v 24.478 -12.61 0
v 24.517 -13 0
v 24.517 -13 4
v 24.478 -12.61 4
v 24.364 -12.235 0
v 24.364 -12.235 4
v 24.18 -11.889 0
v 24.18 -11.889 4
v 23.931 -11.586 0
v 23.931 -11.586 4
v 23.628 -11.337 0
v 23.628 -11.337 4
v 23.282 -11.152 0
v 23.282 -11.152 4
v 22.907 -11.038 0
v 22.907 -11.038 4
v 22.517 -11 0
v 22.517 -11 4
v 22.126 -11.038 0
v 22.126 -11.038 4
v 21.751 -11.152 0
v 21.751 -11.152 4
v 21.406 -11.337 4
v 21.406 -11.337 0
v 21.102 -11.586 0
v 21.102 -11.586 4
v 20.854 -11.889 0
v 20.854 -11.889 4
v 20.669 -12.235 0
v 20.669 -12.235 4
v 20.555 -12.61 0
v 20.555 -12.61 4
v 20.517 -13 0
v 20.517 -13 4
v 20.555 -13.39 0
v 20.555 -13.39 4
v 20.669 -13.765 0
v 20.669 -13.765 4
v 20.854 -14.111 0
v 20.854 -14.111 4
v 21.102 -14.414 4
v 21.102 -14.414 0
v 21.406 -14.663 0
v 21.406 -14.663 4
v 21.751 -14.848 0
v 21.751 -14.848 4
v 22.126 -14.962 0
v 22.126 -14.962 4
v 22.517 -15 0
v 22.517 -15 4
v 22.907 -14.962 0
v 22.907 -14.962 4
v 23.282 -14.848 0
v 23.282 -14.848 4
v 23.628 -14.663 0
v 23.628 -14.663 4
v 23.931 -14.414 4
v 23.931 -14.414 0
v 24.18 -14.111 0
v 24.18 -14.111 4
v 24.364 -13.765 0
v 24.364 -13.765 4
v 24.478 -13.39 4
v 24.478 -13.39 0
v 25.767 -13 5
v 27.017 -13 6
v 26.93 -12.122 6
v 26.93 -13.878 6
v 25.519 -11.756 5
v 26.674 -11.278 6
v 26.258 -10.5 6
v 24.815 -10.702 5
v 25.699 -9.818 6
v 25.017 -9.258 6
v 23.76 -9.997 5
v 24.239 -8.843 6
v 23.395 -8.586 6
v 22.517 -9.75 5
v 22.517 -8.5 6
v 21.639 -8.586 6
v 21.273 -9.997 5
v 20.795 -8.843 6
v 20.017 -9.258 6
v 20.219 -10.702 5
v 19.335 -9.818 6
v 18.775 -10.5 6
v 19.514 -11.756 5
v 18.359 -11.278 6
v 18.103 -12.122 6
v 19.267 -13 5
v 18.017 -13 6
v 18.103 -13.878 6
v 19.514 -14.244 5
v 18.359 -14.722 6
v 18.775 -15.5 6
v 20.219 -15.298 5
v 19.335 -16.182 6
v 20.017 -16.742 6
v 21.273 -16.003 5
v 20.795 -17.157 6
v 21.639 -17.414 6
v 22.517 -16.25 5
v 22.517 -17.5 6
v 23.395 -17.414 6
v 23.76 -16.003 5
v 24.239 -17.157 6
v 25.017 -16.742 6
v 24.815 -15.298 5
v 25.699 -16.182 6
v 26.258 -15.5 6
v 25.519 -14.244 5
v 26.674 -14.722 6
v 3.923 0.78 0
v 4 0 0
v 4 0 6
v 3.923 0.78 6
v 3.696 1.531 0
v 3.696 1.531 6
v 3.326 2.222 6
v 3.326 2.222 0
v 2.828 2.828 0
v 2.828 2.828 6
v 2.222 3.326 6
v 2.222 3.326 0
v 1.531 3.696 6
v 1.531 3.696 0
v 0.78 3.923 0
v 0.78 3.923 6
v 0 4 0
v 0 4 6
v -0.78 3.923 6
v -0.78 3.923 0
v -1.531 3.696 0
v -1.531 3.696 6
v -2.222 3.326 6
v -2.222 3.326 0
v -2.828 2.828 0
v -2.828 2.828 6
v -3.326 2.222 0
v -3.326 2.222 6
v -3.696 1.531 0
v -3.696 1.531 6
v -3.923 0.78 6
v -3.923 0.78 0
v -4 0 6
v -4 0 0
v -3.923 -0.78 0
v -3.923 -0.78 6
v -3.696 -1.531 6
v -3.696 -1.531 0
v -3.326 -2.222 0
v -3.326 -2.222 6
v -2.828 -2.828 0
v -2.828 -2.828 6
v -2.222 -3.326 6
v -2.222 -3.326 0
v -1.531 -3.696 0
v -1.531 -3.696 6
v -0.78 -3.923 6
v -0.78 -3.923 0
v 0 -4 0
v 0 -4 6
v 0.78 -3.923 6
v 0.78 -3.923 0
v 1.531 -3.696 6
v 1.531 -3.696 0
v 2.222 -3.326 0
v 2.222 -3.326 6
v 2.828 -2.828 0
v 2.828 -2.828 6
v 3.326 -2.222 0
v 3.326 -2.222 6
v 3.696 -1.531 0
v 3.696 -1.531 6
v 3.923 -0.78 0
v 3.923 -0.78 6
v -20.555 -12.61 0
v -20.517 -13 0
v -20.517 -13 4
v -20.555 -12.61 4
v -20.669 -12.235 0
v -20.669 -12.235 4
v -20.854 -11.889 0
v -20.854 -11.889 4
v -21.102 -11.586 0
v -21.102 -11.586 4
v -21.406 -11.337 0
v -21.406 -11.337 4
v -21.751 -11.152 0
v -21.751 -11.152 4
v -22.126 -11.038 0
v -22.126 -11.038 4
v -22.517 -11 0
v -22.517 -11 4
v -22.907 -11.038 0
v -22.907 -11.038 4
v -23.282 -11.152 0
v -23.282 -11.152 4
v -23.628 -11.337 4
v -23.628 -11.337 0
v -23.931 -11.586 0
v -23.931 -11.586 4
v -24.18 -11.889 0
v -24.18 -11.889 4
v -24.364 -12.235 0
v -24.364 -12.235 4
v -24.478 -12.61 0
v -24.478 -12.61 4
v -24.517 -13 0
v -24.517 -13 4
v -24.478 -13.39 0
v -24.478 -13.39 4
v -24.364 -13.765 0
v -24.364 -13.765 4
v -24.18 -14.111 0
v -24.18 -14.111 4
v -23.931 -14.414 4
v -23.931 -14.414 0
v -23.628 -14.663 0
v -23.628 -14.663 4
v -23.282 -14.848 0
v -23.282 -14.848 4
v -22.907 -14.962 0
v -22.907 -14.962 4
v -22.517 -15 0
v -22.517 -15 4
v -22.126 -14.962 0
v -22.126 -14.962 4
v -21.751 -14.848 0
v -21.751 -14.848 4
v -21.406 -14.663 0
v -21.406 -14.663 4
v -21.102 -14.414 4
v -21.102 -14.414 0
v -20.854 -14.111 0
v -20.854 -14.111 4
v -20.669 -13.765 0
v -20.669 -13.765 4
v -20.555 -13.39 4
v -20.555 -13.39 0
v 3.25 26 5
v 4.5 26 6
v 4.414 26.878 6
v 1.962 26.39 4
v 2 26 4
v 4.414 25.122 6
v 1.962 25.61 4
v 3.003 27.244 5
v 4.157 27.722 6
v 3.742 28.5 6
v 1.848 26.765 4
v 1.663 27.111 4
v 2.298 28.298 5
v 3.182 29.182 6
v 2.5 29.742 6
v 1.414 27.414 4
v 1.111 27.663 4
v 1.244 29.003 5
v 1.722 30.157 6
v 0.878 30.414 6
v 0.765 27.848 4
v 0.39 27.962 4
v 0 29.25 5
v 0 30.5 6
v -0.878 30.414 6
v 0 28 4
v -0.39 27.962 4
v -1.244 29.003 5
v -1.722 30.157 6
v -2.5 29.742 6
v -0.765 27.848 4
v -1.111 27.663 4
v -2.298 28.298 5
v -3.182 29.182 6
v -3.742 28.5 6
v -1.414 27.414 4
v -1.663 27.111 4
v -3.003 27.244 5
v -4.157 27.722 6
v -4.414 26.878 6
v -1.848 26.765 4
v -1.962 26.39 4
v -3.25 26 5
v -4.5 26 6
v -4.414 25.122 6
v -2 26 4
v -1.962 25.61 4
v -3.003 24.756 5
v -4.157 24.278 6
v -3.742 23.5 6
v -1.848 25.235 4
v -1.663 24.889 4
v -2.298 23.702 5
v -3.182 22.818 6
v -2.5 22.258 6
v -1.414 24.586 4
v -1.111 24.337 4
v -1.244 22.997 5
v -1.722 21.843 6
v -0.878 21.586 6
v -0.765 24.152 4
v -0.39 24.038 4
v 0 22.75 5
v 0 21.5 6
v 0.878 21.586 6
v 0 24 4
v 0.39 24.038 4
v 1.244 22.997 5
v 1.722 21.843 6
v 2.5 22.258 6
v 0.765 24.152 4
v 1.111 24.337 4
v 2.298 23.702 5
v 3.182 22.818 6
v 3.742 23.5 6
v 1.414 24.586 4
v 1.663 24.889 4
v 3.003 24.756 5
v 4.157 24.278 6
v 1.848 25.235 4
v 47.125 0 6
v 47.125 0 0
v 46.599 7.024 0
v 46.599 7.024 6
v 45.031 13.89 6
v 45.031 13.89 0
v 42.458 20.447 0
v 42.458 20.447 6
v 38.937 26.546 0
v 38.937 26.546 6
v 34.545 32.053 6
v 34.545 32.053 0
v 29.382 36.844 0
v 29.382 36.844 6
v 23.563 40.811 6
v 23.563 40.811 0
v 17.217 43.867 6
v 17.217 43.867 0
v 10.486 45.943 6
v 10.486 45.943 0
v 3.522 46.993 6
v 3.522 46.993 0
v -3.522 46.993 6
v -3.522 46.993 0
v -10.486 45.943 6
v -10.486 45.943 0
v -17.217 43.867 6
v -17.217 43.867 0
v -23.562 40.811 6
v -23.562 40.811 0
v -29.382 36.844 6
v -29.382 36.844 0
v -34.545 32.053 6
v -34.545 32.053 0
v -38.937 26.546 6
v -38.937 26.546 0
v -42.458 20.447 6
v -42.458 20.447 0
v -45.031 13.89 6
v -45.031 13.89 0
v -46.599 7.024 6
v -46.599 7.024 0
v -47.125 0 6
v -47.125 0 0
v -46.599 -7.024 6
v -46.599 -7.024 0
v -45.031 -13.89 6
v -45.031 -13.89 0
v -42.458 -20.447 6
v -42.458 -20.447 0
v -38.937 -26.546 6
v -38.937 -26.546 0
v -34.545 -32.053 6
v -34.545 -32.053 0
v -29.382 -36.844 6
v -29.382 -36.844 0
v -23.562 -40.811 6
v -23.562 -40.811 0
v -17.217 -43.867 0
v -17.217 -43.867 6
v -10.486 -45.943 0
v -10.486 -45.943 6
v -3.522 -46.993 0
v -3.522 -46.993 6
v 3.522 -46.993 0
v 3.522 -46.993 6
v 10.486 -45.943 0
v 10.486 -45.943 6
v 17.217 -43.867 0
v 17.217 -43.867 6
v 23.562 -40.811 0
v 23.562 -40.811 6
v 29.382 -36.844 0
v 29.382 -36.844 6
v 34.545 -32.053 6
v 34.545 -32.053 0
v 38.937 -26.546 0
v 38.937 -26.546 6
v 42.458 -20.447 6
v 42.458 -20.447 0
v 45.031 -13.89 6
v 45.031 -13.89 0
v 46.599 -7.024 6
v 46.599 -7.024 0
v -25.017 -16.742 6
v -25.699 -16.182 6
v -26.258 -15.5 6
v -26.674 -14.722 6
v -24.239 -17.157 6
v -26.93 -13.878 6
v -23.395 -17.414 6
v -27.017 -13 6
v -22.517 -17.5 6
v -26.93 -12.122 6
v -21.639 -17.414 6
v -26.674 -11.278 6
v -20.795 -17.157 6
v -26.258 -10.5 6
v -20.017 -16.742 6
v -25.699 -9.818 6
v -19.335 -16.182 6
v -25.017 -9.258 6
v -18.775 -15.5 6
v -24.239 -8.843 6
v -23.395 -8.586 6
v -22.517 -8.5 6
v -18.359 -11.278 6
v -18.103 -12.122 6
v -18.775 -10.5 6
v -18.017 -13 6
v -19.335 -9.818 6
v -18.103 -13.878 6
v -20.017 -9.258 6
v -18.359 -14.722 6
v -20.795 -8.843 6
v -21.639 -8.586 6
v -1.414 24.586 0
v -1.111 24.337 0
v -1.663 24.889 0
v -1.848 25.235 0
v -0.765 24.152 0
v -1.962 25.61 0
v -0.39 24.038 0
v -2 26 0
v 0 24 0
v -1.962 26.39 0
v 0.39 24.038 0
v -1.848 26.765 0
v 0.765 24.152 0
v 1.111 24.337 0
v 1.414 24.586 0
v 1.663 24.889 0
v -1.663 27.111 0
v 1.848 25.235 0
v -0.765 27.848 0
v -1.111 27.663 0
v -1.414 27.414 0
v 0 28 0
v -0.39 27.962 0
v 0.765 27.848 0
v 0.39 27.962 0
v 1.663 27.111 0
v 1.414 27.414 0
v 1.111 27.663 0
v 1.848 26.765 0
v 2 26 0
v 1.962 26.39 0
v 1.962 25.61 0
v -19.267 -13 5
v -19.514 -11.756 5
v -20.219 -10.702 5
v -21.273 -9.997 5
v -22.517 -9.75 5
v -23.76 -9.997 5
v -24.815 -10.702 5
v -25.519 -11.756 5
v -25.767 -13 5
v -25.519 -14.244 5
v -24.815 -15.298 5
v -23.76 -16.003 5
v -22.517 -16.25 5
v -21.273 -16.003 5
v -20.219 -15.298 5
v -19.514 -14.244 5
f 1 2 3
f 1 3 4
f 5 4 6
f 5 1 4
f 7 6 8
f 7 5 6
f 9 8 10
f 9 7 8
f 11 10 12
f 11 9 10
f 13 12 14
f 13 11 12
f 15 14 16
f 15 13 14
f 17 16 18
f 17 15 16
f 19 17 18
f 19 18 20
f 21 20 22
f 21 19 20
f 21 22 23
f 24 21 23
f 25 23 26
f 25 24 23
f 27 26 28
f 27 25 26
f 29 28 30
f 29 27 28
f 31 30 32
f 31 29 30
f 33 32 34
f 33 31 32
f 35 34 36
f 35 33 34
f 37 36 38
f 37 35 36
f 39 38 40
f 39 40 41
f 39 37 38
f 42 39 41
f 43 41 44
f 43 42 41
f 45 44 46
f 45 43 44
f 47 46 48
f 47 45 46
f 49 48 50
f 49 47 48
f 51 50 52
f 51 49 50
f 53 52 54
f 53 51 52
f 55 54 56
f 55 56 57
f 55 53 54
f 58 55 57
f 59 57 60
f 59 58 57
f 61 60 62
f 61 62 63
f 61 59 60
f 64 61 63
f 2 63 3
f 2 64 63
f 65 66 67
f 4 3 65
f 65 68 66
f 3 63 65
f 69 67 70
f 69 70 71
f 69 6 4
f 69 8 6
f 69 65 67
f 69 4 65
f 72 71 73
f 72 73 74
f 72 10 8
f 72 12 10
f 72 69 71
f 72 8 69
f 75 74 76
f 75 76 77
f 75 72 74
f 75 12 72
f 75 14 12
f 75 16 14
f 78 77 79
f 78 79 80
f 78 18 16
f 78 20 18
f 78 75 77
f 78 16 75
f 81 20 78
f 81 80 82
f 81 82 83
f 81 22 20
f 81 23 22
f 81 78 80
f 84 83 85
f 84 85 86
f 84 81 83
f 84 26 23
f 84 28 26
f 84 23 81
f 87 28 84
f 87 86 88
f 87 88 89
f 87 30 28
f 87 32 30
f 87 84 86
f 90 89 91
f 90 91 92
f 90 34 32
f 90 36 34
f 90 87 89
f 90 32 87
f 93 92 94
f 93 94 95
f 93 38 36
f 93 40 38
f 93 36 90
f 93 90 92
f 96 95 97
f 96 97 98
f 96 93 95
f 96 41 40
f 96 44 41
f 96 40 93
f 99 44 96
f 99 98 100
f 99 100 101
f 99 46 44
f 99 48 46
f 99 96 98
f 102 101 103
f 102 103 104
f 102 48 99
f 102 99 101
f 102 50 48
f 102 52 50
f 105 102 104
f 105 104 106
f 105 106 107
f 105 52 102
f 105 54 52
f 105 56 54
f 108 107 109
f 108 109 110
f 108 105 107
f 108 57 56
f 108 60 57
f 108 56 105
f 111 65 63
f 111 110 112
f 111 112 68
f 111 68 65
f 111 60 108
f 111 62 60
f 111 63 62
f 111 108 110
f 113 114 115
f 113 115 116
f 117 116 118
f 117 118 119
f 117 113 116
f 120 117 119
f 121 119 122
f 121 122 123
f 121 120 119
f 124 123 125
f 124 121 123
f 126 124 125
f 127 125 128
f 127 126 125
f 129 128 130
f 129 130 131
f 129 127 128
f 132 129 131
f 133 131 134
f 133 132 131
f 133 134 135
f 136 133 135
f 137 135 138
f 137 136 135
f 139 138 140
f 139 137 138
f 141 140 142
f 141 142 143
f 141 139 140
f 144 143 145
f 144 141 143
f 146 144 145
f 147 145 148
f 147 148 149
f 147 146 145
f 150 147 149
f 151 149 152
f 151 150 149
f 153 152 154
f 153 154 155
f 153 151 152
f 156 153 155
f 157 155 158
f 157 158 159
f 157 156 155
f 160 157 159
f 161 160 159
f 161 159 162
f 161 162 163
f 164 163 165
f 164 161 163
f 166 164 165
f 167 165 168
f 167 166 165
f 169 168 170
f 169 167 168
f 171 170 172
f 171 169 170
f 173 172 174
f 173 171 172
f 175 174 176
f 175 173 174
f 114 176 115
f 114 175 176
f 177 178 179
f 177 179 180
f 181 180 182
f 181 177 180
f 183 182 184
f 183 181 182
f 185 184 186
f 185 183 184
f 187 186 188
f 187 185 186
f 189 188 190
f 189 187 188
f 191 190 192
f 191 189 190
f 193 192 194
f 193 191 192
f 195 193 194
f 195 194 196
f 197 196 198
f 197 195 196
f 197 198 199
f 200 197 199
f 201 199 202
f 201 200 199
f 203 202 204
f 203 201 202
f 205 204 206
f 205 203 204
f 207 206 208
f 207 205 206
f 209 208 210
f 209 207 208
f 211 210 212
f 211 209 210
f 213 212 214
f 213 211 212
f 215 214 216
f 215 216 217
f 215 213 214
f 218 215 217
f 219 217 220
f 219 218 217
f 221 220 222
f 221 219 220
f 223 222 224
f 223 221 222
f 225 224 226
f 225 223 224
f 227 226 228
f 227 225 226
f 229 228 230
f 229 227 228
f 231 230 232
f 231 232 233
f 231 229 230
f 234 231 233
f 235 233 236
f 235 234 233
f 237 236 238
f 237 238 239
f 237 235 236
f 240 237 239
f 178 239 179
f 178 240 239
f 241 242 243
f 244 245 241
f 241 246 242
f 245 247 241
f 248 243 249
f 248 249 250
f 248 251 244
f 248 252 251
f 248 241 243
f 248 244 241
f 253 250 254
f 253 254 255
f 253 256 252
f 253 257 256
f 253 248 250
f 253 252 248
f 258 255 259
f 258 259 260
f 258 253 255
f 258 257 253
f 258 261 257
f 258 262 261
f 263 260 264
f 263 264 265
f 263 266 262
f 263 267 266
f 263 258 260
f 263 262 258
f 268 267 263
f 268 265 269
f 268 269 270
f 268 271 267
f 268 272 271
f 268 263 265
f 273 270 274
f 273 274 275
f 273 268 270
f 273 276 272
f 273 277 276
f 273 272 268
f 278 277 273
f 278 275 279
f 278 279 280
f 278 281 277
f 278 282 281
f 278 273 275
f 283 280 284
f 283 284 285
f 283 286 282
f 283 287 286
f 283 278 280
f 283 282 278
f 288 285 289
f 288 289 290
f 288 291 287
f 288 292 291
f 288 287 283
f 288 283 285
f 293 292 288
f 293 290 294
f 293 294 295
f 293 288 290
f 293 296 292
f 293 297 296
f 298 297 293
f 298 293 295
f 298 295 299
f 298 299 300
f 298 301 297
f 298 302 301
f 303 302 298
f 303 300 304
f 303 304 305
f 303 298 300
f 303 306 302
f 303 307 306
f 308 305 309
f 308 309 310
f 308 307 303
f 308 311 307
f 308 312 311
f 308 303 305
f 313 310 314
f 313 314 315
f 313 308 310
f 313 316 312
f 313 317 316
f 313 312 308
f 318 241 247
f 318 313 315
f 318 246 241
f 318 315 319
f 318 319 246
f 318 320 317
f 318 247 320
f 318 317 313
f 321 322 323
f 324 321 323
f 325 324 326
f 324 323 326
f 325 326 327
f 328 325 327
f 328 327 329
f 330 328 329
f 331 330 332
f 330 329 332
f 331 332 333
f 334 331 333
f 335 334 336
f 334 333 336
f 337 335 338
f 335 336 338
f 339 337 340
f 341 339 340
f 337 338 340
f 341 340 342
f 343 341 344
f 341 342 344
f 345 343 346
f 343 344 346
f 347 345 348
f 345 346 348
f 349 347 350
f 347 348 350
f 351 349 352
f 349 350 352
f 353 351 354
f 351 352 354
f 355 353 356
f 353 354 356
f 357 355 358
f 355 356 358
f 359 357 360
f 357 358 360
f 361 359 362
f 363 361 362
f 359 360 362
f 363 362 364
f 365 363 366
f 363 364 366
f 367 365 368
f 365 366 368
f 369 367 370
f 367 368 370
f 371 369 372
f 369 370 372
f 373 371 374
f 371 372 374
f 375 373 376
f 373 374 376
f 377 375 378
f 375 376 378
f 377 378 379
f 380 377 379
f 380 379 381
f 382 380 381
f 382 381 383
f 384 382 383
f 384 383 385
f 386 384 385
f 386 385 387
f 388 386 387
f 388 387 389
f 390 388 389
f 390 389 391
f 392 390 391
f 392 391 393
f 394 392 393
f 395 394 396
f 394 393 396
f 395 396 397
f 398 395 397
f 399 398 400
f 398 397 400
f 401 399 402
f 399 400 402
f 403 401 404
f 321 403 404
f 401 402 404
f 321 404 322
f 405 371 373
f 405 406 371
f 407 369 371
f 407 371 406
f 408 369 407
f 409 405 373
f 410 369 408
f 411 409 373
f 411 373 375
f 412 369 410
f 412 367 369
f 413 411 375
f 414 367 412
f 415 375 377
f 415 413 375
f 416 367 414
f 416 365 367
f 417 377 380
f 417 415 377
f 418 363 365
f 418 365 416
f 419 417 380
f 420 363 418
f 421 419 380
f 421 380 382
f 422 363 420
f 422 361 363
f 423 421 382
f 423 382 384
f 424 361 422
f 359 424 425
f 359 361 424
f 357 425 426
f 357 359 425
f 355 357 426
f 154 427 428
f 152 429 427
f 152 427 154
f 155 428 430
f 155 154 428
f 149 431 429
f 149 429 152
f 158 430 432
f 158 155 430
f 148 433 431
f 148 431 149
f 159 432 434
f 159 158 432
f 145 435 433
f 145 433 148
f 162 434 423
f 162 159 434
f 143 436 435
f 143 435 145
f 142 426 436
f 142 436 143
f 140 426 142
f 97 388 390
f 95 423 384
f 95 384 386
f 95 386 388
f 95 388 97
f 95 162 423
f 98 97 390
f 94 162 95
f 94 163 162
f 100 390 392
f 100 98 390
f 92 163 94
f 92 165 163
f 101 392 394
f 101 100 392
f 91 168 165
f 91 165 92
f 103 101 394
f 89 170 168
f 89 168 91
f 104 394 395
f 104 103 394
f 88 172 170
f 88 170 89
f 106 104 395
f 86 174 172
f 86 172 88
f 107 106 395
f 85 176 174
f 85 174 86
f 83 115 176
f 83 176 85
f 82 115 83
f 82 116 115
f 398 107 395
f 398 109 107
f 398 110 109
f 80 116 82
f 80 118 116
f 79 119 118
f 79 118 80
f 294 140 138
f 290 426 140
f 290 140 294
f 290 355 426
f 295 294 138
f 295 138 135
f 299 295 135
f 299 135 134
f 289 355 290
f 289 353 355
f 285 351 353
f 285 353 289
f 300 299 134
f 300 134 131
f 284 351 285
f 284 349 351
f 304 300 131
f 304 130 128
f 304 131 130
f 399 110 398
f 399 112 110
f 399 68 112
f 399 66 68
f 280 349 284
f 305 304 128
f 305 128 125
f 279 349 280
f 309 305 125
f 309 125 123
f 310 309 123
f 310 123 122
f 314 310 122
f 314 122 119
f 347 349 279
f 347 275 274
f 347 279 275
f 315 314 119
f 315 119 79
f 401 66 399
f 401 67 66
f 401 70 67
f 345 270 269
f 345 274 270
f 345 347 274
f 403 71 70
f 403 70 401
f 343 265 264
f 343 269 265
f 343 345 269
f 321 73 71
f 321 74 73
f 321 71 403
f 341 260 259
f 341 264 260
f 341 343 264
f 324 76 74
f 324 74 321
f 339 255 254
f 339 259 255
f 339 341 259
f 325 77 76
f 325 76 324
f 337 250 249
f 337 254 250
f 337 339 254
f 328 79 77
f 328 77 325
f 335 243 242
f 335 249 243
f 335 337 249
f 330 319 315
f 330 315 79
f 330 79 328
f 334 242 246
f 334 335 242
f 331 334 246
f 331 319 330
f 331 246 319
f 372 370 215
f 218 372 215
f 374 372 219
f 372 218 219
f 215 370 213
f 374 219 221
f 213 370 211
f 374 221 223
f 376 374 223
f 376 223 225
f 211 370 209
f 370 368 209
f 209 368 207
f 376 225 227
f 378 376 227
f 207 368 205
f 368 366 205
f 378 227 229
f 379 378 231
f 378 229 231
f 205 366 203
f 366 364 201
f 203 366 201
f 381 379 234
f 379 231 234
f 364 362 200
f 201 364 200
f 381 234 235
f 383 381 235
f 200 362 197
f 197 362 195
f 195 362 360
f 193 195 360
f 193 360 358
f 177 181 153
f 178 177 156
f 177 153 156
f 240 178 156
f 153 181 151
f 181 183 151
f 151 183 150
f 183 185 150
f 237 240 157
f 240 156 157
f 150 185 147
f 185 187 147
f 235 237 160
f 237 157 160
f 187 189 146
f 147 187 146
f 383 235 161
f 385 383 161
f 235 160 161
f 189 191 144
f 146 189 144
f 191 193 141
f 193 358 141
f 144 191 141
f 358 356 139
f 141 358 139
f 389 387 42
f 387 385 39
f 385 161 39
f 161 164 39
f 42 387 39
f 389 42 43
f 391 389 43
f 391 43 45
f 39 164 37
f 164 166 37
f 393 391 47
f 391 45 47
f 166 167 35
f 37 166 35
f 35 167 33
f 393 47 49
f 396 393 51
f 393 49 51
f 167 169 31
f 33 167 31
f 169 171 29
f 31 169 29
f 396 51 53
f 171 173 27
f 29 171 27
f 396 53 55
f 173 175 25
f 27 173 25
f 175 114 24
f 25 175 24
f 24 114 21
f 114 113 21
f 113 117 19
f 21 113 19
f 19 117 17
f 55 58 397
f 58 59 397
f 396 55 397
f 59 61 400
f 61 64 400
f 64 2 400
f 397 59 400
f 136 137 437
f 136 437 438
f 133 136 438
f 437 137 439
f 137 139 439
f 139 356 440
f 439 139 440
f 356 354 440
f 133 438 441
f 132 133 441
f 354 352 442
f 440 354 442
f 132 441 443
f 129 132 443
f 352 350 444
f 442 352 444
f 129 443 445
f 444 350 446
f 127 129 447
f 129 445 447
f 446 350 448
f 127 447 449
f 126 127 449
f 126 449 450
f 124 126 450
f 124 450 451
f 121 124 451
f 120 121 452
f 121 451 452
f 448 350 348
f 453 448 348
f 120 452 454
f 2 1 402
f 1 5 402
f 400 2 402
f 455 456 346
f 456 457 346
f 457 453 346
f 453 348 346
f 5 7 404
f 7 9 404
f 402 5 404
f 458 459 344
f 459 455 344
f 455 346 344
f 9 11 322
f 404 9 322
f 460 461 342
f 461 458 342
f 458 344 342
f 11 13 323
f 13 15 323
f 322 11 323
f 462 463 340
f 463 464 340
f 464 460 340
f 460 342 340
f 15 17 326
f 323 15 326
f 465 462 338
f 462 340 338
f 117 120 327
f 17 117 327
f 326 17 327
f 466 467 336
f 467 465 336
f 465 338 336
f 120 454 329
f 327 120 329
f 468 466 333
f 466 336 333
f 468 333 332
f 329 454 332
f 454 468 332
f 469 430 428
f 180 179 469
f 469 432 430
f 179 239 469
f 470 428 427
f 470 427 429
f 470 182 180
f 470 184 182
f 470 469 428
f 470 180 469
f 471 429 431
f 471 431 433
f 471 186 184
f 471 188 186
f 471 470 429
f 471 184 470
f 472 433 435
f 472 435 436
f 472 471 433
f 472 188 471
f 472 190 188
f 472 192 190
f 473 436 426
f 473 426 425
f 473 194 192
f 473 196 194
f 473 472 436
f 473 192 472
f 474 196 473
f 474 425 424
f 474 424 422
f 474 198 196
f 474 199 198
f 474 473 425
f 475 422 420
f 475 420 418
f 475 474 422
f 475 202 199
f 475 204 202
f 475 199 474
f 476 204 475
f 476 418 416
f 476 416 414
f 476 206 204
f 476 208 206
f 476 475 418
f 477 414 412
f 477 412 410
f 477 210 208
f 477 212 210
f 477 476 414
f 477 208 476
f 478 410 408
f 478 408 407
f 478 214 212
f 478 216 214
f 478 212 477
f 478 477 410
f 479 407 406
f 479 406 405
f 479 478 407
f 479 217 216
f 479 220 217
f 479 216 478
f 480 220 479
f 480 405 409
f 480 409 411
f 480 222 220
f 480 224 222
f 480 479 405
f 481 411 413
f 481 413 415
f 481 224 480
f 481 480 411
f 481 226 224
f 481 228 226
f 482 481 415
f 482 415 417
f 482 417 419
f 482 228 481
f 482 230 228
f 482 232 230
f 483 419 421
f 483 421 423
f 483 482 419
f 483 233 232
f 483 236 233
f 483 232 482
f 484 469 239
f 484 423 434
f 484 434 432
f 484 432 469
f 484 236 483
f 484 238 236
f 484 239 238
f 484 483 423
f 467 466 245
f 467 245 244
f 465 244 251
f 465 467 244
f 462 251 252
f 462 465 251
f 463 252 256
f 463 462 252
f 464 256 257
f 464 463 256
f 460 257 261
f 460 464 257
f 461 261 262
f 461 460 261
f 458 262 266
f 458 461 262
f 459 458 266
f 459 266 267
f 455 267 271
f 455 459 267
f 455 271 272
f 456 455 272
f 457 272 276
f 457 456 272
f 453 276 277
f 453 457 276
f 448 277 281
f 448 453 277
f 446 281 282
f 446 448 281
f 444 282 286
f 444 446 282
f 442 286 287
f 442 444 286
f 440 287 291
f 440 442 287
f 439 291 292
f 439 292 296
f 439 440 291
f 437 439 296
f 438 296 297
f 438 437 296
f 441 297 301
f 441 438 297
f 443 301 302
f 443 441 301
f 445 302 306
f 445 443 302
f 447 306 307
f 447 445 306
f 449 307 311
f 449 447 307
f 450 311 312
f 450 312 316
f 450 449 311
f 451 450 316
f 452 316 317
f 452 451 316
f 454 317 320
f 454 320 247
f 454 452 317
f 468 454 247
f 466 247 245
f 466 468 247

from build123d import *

# Parameters (mm, degrees)
SKETCH3_R           = 47.125
SKETCH3_R_2         = 4
SKETCH3_R_3         = 2
BOSS_EXTRUDE1_DEPTH = 6
CHAMFER1_SIZE       = 2.5
CHAMFER1_SIZE2      = 2


with BuildPart() as part:
    # Sketch3 → Boss-Extrude1 (new body)
    with BuildSketch(Plane(origin=(0, 0, 0), x_dir=(0, 1, 0), z_dir=(0, 0, 1))):
        with Locations(Location((0, 0, 0), (0, 0, 270))):
            Circle(SKETCH3_R)
        with Locations(Location((0, 0, 0), (0, 0, 270))):
            Circle(SKETCH3_R_2, mode=Mode.SUBTRACT)
        with Locations(Location((26, 0, 0), (0, 0, 270))):
            Circle(SKETCH3_R_3, mode=Mode.SUBTRACT)
        with Locations(Location((-13, -22.516660498, 0), (0, 0, 270))):
            Circle(SKETCH3_R_3, mode=Mode.SUBTRACT)
        with Locations(Location((-13, 22.516660498, 0), (0, 0, 270))):
            Circle(SKETCH3_R_3, mode=Mode.SUBTRACT)
    extrude(amount=BOSS_EXTRUDE1_DEPTH)

    # Chamfer1
    chamfer1_edges = [part.edges().sort_by_distance(p)[0] for p in [
        (20.516660498, -13, 6),
        (-24.516660498, -13, 6),
        (-2, 26, 6),
    ]]
    chamfer1_side = [part.faces().sort_by_distance(p)[0] for p in [
        (-45.792103717, 0, 6),
    ]]
    chamfer(chamfer1_edges, length=CHAMFER1_SIZE, length2=CHAMFER1_SIZE2, reference=chamfer1_side[0])


solid = part.part
